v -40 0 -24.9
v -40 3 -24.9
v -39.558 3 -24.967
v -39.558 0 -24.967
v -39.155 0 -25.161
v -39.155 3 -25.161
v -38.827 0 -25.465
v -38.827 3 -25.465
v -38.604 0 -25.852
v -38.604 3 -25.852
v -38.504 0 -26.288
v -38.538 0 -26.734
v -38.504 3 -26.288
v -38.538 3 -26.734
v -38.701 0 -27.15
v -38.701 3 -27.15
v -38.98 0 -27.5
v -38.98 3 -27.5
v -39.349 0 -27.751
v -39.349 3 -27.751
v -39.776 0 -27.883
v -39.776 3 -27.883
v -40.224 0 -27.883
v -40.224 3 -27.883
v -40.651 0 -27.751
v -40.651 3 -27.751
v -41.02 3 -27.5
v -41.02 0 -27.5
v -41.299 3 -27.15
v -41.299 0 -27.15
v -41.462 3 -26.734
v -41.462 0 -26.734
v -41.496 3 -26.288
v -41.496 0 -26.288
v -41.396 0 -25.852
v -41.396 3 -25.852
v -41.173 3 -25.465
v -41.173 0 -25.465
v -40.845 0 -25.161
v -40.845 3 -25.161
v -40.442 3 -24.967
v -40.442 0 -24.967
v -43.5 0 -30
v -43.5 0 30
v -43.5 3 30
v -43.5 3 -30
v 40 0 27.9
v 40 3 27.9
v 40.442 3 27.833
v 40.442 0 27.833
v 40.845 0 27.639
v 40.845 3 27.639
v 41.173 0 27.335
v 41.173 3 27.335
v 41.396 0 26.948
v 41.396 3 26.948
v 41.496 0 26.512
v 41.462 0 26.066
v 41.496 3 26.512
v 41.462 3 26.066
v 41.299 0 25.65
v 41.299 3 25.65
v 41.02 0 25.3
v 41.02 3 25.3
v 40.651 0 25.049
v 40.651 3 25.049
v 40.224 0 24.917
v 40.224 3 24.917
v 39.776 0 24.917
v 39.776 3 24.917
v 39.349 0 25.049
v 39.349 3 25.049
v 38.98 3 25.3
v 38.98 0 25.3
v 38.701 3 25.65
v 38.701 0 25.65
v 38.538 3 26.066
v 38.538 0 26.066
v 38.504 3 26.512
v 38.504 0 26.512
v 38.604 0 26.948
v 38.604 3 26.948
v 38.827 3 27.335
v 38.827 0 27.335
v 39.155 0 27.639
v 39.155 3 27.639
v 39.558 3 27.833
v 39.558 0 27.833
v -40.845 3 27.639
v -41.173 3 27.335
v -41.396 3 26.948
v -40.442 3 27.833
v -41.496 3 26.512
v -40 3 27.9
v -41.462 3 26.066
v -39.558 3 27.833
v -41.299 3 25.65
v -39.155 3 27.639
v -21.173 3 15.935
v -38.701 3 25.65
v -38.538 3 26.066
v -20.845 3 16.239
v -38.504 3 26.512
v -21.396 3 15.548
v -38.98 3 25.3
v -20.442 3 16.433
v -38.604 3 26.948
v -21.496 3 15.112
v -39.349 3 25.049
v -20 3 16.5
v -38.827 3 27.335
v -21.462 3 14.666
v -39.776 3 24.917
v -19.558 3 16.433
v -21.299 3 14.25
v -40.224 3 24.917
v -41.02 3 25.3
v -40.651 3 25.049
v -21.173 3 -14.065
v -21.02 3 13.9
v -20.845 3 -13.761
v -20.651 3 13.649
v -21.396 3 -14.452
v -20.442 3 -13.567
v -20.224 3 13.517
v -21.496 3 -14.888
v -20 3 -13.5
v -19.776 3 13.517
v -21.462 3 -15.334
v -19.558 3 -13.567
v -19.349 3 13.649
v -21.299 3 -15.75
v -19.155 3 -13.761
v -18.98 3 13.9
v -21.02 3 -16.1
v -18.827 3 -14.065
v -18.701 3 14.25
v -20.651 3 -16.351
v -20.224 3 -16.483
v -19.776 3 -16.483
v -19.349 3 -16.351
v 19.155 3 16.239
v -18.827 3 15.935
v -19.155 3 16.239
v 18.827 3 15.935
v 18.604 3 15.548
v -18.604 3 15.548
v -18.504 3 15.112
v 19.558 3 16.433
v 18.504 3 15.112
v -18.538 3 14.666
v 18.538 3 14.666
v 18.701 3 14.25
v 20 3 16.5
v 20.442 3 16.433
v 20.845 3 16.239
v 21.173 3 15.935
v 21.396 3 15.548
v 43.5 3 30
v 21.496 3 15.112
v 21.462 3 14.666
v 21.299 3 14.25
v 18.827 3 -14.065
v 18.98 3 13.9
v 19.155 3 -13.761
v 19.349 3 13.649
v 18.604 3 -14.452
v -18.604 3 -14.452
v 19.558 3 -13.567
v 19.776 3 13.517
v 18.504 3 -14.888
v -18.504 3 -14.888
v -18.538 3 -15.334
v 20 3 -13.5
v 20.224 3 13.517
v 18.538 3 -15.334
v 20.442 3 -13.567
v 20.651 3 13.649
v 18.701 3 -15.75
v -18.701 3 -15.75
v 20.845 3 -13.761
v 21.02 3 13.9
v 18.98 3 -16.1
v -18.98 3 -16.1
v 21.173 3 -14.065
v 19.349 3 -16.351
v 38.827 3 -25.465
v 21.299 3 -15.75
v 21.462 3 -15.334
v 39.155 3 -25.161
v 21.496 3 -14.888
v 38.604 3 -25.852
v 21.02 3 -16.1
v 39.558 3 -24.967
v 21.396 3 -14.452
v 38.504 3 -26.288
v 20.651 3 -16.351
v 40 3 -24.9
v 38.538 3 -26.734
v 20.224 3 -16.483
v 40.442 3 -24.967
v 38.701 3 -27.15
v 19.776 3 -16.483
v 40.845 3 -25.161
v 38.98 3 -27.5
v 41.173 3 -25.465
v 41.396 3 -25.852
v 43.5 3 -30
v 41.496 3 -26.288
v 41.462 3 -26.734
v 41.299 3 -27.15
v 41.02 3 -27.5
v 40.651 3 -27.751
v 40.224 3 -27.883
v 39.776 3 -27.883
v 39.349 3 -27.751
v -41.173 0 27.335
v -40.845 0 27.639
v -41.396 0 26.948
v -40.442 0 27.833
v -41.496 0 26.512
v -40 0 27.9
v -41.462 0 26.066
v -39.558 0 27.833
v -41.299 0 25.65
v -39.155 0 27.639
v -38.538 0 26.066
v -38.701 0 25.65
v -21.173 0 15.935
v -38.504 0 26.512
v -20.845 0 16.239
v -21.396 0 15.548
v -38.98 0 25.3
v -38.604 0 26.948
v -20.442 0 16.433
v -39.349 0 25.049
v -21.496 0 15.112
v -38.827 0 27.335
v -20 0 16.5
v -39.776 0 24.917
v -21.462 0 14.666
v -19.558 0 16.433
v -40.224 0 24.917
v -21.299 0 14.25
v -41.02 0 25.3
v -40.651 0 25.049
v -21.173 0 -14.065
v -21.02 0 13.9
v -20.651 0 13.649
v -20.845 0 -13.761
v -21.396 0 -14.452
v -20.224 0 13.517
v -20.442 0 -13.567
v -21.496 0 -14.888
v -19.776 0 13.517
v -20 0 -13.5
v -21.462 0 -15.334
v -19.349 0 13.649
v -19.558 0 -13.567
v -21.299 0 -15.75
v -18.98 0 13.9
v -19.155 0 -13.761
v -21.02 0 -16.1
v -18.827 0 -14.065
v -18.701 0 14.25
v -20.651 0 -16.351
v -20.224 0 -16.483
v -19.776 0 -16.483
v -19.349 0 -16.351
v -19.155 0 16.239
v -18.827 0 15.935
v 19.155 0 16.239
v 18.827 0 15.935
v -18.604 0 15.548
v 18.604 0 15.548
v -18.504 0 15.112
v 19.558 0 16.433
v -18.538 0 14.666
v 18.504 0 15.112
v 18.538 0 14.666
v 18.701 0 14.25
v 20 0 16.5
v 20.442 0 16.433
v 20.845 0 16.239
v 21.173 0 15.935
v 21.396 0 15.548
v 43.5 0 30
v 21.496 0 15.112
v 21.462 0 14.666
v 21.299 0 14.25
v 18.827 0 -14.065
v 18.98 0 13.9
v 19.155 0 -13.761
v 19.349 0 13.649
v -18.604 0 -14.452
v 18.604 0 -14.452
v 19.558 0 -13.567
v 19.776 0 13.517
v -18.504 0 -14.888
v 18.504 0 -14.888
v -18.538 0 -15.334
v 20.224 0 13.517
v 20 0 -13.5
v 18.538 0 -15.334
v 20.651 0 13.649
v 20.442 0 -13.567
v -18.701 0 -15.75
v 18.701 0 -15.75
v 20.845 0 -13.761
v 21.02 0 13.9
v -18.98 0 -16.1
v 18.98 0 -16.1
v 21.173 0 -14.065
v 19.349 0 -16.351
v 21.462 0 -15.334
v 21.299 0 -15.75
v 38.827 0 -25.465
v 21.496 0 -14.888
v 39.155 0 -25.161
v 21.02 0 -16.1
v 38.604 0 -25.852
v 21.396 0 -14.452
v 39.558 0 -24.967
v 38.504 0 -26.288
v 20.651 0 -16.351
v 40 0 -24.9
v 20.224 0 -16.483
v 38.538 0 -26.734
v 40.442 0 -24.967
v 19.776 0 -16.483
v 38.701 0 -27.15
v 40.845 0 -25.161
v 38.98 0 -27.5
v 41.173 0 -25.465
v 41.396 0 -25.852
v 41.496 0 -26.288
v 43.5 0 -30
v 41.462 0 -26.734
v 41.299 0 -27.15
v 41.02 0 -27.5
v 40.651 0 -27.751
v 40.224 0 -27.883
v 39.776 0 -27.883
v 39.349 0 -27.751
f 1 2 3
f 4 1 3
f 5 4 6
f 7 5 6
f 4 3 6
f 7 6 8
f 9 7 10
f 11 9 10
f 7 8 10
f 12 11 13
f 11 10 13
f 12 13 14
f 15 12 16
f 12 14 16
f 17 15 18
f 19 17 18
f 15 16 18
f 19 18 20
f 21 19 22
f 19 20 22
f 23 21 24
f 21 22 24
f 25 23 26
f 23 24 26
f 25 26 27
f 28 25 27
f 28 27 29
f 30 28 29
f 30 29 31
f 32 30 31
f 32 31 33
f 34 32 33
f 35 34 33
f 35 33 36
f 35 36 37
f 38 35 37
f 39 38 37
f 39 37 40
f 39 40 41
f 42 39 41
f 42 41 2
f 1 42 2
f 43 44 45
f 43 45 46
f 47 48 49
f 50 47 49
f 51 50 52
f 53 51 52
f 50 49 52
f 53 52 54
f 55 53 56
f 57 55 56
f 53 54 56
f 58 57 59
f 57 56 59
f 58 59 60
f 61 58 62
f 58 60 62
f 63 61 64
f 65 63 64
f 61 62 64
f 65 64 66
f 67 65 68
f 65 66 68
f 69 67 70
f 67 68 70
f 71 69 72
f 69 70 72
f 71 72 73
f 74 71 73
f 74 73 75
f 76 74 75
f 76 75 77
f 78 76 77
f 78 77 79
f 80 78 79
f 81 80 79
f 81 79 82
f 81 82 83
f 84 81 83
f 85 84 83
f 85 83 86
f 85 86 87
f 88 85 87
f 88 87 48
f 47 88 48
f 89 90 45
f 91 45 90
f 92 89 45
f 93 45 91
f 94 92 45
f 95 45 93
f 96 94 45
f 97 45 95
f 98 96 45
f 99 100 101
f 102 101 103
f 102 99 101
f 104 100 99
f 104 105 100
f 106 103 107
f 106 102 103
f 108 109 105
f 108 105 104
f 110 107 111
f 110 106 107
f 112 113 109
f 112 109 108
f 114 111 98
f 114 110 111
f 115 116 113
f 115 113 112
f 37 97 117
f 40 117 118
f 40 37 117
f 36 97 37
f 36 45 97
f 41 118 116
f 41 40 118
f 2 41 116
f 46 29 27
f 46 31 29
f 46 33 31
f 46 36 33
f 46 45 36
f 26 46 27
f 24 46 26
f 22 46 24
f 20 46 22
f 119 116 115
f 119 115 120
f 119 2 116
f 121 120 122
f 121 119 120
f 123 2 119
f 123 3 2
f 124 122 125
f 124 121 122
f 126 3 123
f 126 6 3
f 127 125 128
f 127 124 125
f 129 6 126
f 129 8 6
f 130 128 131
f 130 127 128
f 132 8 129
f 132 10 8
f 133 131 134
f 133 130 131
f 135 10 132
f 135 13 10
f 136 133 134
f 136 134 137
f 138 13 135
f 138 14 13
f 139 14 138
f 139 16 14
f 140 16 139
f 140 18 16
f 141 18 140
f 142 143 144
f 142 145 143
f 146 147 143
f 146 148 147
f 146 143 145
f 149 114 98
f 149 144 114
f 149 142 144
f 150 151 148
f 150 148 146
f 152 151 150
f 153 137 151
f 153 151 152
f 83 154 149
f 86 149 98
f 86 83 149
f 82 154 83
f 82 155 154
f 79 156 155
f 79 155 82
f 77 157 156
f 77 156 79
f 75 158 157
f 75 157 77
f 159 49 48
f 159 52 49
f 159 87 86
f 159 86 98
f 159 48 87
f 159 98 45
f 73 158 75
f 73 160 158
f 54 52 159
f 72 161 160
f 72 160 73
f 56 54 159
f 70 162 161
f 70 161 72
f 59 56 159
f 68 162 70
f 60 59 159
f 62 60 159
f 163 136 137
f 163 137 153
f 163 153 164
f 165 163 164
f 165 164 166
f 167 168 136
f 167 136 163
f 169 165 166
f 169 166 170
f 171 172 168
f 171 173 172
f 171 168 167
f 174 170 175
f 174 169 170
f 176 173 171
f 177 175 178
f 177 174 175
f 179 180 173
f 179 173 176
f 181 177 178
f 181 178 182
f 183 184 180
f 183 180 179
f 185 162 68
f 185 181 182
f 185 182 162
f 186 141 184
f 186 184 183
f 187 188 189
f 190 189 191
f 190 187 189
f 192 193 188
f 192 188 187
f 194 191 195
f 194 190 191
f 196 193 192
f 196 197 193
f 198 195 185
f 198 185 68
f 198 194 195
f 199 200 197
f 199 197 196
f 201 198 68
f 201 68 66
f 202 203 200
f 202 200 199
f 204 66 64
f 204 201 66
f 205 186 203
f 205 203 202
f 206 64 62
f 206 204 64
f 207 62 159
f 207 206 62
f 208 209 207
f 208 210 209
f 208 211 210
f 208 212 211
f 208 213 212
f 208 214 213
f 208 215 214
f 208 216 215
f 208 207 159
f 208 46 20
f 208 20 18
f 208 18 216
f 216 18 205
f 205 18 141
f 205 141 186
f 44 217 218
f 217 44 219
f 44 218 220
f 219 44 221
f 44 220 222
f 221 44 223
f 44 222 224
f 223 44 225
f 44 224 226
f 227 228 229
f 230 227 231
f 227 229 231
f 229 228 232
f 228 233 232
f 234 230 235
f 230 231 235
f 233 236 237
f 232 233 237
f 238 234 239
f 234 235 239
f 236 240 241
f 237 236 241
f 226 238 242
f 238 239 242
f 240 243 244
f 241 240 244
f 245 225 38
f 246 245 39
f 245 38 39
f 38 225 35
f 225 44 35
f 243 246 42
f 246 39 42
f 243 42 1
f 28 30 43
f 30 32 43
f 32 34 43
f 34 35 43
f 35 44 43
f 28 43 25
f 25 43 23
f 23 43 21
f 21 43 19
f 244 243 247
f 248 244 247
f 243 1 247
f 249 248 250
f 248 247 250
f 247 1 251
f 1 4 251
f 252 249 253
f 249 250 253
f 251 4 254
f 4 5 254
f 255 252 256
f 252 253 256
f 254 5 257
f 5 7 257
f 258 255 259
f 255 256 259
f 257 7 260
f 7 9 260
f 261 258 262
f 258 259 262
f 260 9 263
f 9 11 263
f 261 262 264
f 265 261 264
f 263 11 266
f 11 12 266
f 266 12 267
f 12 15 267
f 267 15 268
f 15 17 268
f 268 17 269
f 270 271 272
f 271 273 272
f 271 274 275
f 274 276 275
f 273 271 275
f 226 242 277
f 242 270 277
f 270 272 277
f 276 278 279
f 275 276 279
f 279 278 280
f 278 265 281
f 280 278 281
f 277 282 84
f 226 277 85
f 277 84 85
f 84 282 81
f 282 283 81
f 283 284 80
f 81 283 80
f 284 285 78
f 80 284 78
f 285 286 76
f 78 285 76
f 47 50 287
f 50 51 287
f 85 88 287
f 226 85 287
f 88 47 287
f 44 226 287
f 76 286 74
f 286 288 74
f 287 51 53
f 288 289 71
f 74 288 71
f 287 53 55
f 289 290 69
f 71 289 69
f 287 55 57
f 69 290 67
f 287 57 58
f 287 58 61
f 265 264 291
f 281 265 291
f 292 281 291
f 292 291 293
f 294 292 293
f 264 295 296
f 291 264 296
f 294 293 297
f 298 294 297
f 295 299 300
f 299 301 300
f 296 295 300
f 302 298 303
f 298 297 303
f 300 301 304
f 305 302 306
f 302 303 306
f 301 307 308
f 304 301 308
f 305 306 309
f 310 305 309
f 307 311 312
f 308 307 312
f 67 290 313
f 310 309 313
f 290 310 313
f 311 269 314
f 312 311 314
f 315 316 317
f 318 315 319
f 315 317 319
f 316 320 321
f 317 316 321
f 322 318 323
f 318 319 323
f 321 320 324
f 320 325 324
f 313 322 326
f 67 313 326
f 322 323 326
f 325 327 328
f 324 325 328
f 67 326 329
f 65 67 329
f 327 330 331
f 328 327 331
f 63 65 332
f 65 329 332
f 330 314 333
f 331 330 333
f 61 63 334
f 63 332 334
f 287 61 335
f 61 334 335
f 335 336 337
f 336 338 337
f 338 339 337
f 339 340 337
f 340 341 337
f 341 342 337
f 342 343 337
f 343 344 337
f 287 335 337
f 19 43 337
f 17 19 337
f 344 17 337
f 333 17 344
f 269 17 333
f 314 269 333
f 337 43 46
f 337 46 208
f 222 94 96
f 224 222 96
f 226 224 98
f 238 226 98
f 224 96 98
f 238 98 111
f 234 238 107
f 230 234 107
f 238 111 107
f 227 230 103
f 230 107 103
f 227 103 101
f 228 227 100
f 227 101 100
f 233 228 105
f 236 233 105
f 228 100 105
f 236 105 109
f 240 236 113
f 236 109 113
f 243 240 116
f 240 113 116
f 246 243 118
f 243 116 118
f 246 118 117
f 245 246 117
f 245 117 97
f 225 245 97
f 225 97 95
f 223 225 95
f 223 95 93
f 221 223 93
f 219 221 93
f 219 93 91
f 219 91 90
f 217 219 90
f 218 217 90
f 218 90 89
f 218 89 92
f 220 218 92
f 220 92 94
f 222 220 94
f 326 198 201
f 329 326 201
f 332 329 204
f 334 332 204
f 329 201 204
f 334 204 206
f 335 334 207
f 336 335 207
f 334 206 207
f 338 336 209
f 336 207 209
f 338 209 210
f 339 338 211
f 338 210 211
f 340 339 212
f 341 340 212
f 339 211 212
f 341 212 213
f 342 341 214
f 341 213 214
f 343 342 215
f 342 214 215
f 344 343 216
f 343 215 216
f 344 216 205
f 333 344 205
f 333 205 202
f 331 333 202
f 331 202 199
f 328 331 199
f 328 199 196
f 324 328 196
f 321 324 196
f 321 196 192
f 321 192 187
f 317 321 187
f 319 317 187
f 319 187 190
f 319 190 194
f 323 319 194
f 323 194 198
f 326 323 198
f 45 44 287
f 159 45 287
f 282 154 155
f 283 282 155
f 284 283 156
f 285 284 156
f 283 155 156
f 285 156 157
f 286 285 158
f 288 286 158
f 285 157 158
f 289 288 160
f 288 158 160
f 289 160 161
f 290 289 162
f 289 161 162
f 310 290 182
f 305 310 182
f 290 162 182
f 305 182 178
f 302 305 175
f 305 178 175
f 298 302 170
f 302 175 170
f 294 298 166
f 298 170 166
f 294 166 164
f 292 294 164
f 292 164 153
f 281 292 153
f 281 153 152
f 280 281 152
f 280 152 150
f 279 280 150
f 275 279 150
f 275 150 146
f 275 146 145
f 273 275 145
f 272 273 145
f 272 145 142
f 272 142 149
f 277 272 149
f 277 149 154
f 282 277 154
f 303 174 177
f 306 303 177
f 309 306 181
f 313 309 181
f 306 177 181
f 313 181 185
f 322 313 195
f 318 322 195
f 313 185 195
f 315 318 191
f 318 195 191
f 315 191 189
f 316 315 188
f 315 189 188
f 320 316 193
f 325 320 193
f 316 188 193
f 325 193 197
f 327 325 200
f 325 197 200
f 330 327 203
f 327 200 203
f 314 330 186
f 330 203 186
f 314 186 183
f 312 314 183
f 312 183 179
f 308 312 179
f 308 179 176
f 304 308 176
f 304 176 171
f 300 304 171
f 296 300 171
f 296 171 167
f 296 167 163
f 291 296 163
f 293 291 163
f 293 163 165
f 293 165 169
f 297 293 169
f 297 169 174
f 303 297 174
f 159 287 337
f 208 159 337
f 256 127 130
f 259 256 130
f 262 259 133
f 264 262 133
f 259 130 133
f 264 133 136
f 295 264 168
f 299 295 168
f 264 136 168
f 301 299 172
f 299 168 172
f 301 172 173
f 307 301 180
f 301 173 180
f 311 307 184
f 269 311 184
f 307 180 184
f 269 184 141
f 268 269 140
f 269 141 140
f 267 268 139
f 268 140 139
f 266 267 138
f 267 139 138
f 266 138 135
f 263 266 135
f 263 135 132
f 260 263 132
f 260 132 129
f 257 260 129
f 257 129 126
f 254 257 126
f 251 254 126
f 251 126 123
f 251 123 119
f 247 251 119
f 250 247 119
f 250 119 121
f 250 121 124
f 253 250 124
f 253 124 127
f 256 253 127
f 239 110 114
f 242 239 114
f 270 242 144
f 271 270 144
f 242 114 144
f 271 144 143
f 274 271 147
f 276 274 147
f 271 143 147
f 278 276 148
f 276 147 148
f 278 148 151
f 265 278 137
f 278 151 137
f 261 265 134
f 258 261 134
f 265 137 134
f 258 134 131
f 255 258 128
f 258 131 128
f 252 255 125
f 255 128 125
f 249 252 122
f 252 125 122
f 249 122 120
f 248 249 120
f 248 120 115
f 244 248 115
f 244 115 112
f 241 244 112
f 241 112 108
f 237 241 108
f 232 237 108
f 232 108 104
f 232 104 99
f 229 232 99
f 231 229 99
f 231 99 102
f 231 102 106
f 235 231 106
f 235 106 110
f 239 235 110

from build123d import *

# Parameters (mm, degrees)
SKETCH_1_W          = 87
SKETCH_1_H          = 60
EXTRUDE_1_DEPTH     = 3
SKETCH_2_R          = 1.5
CUT_EXTRUDE_1_DEPTH = 53.926836293
SKETCH_3_R          = 1.5
CUT_EXTRUDE_2_DEPTH = 53.926836293


with BuildPart() as part:
    # 草图1 → 凸台-拉伸1 (new body)
    with BuildSketch(Plane(origin=(0, 0, 0), x_dir=(1, 0, 0), z_dir=(0, 1, 0))):
        Rectangle(SKETCH_1_W, SKETCH_1_H)
    extrude(amount=EXTRUDE_1_DEPTH)

    # 草图2 → 切除-拉伸1 (cut, through all)
    with BuildSketch(Plane(origin=(0, 3, 0), x_dir=(1, 0, 0), z_dir=(0, 1, 0))):
        with Locations(Location((-40, 26.4, 0), (0, 0, 270))):
            Circle(SKETCH_2_R)
        with Locations(Location((40, 26.4, 0), (0, 0, 270))):
            Circle(SKETCH_2_R)
        with Locations(Location((40, -26.4, 0), (0, 0, 270))):
            Circle(SKETCH_2_R)
        with Locations(Location((-40, -26.4, 0), (0, 0, 270))):
            Circle(SKETCH_2_R)
    extrude(amount=-CUT_EXTRUDE_1_DEPTH, mode=Mode.SUBTRACT)

    # 草图3 → 切除-拉伸2 (cut, through all)
    with BuildSketch(Plane(origin=(0, 3, 0), x_dir=(1, 0, 0), z_dir=(0, 1, 0))):
        with Locations(Location((20, 15, 0), (0, 0, 270))):
            Circle(SKETCH_3_R)
        with Locations(Location((20, -15, 0), (0, 0, 270))):
            Circle(SKETCH_3_R)
        with Locations(Location((-20, 15, 0), (0, 0, 270))):
            Circle(SKETCH_3_R)
        with Locations(Location((-20, -15, 0), (0, 0, 270))):
            Circle(SKETCH_3_R)
    extrude(amount=-CUT_EXTRUDE_2_DEPTH, mode=Mode.SUBTRACT)


solid = part.part
